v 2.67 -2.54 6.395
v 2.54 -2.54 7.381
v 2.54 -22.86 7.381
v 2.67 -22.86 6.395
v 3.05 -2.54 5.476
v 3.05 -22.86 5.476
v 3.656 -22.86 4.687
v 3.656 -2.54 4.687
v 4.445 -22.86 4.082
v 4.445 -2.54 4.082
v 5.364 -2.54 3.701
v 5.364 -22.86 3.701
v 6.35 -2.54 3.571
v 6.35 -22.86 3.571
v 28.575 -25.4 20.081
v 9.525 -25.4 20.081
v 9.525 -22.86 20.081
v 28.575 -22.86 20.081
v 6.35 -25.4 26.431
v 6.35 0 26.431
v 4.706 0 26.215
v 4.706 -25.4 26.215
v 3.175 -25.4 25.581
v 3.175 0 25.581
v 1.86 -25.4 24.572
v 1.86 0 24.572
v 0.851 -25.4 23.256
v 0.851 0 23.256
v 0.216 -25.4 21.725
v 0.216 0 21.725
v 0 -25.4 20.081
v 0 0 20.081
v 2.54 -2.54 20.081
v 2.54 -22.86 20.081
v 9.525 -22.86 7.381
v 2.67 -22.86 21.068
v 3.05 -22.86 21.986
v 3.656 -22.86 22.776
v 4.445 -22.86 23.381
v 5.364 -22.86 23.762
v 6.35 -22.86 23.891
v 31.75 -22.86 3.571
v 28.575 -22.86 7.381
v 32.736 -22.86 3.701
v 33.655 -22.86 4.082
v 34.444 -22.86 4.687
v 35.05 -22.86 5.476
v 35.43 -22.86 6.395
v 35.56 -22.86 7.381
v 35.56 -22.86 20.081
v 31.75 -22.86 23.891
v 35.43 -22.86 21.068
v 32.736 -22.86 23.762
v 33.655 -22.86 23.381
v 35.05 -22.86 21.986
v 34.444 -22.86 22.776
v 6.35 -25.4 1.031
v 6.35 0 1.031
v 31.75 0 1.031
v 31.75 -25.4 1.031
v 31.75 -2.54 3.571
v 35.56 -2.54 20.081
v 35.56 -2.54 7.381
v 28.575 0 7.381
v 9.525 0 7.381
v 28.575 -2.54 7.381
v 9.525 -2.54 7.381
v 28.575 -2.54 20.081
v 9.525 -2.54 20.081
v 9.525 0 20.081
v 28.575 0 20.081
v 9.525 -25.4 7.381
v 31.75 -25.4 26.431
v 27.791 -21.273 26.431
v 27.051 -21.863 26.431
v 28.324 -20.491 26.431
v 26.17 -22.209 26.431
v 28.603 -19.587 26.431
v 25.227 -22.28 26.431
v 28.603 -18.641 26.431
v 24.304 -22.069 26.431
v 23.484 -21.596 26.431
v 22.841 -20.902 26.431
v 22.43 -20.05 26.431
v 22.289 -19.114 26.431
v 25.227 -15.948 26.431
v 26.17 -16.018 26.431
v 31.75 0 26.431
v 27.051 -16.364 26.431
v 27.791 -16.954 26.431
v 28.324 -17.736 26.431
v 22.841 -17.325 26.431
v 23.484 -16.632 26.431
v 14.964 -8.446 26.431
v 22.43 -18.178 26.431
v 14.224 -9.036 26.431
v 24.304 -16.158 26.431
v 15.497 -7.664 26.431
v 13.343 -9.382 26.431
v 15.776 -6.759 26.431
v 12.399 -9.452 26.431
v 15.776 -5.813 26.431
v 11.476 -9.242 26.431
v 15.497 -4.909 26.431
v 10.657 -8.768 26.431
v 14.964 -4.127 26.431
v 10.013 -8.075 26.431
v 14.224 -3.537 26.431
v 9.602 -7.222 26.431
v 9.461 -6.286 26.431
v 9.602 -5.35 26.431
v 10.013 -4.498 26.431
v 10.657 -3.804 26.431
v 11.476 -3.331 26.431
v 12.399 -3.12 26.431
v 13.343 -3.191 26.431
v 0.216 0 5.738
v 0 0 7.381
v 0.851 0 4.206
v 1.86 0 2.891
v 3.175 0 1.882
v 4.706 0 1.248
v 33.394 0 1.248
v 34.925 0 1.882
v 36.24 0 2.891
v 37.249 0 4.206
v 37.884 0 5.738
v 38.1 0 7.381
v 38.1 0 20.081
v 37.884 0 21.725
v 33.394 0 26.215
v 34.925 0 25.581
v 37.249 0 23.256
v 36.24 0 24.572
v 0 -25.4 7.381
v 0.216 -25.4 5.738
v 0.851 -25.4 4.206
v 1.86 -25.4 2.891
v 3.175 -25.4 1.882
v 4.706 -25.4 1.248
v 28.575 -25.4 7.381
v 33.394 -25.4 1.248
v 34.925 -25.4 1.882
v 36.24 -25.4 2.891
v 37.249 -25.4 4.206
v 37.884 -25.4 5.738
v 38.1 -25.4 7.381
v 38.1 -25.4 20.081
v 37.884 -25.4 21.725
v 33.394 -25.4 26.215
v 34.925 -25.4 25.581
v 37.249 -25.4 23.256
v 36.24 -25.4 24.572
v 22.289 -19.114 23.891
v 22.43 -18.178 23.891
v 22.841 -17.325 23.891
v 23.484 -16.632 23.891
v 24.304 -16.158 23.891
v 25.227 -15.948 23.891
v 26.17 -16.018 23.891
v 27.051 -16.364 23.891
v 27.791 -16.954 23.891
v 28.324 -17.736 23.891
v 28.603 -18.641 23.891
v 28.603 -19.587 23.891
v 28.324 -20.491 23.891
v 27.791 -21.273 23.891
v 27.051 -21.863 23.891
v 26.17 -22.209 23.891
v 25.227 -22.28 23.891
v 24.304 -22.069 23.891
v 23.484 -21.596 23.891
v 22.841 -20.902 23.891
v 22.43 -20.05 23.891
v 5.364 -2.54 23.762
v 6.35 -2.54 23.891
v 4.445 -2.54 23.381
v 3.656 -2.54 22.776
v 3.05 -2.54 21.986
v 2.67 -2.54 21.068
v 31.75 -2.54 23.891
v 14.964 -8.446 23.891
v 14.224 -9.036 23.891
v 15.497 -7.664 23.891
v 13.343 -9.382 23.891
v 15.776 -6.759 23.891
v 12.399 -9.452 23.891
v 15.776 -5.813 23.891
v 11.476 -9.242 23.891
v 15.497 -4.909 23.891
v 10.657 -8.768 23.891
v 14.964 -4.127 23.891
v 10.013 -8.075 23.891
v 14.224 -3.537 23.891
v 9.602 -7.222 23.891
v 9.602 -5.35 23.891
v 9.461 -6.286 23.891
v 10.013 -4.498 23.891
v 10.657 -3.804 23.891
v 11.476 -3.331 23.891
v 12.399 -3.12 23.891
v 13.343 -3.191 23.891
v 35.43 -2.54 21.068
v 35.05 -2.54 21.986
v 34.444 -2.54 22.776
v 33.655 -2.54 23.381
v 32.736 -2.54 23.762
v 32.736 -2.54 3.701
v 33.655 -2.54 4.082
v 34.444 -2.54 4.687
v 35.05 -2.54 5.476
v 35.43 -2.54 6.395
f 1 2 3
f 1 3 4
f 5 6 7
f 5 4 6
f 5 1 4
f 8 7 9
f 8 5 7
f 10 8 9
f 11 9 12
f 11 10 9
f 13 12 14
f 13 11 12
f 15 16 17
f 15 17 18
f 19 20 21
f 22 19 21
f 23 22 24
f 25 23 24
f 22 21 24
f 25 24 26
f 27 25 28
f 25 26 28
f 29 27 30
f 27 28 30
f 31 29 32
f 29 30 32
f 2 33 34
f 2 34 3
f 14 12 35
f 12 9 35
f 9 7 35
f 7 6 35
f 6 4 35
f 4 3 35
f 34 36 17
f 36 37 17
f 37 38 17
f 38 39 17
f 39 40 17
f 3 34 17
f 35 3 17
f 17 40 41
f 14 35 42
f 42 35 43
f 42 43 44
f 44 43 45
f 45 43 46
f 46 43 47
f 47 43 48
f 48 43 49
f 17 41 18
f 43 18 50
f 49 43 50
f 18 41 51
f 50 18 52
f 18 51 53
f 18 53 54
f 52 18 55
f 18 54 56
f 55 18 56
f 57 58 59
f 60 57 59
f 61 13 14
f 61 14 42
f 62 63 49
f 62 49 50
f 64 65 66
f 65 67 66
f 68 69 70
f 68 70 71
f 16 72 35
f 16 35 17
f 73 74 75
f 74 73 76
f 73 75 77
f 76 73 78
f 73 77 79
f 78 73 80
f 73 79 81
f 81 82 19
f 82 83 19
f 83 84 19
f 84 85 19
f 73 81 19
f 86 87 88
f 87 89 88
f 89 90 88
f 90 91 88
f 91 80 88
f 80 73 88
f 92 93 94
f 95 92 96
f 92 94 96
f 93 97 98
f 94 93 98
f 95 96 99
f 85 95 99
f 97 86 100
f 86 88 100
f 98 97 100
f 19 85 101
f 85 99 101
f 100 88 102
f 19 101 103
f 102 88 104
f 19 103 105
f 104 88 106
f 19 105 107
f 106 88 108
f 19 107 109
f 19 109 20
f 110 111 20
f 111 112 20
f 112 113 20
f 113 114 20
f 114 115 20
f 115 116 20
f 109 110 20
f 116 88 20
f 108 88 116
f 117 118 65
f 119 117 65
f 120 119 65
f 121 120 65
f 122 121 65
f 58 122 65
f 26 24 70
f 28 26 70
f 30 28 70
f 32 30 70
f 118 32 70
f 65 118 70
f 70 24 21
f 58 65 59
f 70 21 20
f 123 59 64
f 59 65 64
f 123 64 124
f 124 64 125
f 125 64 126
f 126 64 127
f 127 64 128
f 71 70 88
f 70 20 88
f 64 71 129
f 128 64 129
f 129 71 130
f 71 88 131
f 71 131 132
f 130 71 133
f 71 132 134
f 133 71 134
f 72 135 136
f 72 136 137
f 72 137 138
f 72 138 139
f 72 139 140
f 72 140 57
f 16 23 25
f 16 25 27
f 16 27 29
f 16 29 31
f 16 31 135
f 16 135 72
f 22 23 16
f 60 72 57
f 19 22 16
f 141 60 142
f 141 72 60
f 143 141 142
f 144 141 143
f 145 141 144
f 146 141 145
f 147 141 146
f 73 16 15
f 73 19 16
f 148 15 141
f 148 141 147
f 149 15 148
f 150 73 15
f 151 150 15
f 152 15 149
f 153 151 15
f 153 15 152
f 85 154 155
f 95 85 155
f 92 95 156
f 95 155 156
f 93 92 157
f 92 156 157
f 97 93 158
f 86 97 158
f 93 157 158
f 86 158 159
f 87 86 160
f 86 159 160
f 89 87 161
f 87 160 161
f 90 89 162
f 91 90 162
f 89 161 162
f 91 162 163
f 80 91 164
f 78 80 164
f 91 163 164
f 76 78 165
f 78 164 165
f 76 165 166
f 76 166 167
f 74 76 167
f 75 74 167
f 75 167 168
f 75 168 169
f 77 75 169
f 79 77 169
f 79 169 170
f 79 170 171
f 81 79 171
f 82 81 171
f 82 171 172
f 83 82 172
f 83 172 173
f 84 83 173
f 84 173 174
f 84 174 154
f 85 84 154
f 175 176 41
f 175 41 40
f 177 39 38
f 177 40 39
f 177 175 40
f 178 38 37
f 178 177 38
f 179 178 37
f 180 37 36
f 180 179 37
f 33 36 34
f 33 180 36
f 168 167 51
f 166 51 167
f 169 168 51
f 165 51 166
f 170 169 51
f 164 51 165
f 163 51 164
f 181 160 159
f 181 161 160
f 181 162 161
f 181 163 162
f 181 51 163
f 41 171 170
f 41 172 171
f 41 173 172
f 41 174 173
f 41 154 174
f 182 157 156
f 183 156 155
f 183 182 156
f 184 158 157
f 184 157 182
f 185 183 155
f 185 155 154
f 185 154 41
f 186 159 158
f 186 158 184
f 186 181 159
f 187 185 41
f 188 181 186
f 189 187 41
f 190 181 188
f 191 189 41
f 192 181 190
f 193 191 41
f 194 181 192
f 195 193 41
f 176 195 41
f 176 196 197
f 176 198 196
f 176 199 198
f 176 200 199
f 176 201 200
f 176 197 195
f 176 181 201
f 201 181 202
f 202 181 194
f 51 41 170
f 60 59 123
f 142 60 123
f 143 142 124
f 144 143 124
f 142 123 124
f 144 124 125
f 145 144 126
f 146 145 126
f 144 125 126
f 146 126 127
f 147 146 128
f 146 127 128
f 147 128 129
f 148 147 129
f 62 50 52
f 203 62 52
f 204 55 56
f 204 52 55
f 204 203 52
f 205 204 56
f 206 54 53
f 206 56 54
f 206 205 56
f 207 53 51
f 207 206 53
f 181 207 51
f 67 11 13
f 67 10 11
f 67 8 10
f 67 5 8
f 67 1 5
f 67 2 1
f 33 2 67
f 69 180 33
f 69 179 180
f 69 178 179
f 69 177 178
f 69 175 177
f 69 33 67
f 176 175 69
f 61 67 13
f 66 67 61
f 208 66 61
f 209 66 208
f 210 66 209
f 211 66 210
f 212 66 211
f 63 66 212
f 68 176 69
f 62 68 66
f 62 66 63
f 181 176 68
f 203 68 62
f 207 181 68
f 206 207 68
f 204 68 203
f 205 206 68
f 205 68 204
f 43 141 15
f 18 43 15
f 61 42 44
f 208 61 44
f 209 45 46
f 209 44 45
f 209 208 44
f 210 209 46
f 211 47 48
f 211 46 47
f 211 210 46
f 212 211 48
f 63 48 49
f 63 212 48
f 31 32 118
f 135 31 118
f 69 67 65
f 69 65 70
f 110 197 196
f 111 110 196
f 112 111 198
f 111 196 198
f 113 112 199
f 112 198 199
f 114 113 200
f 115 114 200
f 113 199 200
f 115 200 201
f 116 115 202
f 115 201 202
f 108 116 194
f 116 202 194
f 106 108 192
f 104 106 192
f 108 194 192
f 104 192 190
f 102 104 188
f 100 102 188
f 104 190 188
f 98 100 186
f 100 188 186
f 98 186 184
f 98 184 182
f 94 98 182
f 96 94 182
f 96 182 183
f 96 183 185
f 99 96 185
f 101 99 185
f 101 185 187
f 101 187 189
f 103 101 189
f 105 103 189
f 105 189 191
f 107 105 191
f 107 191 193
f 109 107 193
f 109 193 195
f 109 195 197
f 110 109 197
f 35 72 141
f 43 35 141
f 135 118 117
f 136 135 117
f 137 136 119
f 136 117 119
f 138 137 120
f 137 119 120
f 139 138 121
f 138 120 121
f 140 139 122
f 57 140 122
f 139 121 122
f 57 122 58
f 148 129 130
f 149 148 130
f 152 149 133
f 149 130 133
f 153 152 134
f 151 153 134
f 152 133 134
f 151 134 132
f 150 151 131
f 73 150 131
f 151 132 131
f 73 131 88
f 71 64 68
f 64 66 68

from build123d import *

# Parameters (mm, degrees)
F1_DEPTH = 25.4
F2_W     = 19.05
F2_H     = 12.7
F3_DEPTH = 25.401
F4_T     = -2.54
F6_D     = 6.35
F6_DEPTH = 12.7


with BuildPart() as f1:
    # F0 (on Front) → F1 (new body)
    with BuildSketch(Plane.XZ):
        with BuildLine():
            ThreePointArc((0, 7.381471), (1.859872, 2.891343), (6.35, 1.031471))
            Line((6.35, 1.031471), (31.75, 1.031471))
            ThreePointArc((31.75, 1.031471), (36.240128, 2.891343), (38.1, 7.381471))
            Line((38.1, 7.381471), (38.1, 20.081471))
            ThreePointArc((38.1, 20.081471), (36.240128, 24.571599), (31.75, 26.431471))
            Line((31.75, 26.431471), (6.35, 26.431471))
            ThreePointArc((6.35, 26.431471), (1.859872, 24.571599), (0, 20.081471))
            Line((0, 20.081471), (0, 7.381471))
        make_face()
    extrude(amount=F1_DEPTH)

    # F2 (on face) → F3 (cut, through all)
    with BuildSketch(Plane.XZ.offset(25.4)):
        with Locations((19.05, 13.731471)):
            Rectangle(F2_W, F2_H)
    extrude(amount=-F3_DEPTH, mode=Mode.SUBTRACT)

    # F4
    f4_openings = [f1.faces().sort_by_distance(p)[0] for p in [
        (9.525, -12.7, 13.731471),
        (19.05, -12.7, 20.081471),
        (19.05, -12.7, 7.381471),
        (28.575, -12.7, 13.731471),
    ]]
    offset(amount=F4_T, openings=f4_openings)

    # F6
    with Locations(Plane.XY.offset(26.431471)):
        with Locations((12.636179, -6.286179), (25.463821, -19.113821)):
            Hole(F6_D / 2, depth=F6_DEPTH)


solid = f1.part
